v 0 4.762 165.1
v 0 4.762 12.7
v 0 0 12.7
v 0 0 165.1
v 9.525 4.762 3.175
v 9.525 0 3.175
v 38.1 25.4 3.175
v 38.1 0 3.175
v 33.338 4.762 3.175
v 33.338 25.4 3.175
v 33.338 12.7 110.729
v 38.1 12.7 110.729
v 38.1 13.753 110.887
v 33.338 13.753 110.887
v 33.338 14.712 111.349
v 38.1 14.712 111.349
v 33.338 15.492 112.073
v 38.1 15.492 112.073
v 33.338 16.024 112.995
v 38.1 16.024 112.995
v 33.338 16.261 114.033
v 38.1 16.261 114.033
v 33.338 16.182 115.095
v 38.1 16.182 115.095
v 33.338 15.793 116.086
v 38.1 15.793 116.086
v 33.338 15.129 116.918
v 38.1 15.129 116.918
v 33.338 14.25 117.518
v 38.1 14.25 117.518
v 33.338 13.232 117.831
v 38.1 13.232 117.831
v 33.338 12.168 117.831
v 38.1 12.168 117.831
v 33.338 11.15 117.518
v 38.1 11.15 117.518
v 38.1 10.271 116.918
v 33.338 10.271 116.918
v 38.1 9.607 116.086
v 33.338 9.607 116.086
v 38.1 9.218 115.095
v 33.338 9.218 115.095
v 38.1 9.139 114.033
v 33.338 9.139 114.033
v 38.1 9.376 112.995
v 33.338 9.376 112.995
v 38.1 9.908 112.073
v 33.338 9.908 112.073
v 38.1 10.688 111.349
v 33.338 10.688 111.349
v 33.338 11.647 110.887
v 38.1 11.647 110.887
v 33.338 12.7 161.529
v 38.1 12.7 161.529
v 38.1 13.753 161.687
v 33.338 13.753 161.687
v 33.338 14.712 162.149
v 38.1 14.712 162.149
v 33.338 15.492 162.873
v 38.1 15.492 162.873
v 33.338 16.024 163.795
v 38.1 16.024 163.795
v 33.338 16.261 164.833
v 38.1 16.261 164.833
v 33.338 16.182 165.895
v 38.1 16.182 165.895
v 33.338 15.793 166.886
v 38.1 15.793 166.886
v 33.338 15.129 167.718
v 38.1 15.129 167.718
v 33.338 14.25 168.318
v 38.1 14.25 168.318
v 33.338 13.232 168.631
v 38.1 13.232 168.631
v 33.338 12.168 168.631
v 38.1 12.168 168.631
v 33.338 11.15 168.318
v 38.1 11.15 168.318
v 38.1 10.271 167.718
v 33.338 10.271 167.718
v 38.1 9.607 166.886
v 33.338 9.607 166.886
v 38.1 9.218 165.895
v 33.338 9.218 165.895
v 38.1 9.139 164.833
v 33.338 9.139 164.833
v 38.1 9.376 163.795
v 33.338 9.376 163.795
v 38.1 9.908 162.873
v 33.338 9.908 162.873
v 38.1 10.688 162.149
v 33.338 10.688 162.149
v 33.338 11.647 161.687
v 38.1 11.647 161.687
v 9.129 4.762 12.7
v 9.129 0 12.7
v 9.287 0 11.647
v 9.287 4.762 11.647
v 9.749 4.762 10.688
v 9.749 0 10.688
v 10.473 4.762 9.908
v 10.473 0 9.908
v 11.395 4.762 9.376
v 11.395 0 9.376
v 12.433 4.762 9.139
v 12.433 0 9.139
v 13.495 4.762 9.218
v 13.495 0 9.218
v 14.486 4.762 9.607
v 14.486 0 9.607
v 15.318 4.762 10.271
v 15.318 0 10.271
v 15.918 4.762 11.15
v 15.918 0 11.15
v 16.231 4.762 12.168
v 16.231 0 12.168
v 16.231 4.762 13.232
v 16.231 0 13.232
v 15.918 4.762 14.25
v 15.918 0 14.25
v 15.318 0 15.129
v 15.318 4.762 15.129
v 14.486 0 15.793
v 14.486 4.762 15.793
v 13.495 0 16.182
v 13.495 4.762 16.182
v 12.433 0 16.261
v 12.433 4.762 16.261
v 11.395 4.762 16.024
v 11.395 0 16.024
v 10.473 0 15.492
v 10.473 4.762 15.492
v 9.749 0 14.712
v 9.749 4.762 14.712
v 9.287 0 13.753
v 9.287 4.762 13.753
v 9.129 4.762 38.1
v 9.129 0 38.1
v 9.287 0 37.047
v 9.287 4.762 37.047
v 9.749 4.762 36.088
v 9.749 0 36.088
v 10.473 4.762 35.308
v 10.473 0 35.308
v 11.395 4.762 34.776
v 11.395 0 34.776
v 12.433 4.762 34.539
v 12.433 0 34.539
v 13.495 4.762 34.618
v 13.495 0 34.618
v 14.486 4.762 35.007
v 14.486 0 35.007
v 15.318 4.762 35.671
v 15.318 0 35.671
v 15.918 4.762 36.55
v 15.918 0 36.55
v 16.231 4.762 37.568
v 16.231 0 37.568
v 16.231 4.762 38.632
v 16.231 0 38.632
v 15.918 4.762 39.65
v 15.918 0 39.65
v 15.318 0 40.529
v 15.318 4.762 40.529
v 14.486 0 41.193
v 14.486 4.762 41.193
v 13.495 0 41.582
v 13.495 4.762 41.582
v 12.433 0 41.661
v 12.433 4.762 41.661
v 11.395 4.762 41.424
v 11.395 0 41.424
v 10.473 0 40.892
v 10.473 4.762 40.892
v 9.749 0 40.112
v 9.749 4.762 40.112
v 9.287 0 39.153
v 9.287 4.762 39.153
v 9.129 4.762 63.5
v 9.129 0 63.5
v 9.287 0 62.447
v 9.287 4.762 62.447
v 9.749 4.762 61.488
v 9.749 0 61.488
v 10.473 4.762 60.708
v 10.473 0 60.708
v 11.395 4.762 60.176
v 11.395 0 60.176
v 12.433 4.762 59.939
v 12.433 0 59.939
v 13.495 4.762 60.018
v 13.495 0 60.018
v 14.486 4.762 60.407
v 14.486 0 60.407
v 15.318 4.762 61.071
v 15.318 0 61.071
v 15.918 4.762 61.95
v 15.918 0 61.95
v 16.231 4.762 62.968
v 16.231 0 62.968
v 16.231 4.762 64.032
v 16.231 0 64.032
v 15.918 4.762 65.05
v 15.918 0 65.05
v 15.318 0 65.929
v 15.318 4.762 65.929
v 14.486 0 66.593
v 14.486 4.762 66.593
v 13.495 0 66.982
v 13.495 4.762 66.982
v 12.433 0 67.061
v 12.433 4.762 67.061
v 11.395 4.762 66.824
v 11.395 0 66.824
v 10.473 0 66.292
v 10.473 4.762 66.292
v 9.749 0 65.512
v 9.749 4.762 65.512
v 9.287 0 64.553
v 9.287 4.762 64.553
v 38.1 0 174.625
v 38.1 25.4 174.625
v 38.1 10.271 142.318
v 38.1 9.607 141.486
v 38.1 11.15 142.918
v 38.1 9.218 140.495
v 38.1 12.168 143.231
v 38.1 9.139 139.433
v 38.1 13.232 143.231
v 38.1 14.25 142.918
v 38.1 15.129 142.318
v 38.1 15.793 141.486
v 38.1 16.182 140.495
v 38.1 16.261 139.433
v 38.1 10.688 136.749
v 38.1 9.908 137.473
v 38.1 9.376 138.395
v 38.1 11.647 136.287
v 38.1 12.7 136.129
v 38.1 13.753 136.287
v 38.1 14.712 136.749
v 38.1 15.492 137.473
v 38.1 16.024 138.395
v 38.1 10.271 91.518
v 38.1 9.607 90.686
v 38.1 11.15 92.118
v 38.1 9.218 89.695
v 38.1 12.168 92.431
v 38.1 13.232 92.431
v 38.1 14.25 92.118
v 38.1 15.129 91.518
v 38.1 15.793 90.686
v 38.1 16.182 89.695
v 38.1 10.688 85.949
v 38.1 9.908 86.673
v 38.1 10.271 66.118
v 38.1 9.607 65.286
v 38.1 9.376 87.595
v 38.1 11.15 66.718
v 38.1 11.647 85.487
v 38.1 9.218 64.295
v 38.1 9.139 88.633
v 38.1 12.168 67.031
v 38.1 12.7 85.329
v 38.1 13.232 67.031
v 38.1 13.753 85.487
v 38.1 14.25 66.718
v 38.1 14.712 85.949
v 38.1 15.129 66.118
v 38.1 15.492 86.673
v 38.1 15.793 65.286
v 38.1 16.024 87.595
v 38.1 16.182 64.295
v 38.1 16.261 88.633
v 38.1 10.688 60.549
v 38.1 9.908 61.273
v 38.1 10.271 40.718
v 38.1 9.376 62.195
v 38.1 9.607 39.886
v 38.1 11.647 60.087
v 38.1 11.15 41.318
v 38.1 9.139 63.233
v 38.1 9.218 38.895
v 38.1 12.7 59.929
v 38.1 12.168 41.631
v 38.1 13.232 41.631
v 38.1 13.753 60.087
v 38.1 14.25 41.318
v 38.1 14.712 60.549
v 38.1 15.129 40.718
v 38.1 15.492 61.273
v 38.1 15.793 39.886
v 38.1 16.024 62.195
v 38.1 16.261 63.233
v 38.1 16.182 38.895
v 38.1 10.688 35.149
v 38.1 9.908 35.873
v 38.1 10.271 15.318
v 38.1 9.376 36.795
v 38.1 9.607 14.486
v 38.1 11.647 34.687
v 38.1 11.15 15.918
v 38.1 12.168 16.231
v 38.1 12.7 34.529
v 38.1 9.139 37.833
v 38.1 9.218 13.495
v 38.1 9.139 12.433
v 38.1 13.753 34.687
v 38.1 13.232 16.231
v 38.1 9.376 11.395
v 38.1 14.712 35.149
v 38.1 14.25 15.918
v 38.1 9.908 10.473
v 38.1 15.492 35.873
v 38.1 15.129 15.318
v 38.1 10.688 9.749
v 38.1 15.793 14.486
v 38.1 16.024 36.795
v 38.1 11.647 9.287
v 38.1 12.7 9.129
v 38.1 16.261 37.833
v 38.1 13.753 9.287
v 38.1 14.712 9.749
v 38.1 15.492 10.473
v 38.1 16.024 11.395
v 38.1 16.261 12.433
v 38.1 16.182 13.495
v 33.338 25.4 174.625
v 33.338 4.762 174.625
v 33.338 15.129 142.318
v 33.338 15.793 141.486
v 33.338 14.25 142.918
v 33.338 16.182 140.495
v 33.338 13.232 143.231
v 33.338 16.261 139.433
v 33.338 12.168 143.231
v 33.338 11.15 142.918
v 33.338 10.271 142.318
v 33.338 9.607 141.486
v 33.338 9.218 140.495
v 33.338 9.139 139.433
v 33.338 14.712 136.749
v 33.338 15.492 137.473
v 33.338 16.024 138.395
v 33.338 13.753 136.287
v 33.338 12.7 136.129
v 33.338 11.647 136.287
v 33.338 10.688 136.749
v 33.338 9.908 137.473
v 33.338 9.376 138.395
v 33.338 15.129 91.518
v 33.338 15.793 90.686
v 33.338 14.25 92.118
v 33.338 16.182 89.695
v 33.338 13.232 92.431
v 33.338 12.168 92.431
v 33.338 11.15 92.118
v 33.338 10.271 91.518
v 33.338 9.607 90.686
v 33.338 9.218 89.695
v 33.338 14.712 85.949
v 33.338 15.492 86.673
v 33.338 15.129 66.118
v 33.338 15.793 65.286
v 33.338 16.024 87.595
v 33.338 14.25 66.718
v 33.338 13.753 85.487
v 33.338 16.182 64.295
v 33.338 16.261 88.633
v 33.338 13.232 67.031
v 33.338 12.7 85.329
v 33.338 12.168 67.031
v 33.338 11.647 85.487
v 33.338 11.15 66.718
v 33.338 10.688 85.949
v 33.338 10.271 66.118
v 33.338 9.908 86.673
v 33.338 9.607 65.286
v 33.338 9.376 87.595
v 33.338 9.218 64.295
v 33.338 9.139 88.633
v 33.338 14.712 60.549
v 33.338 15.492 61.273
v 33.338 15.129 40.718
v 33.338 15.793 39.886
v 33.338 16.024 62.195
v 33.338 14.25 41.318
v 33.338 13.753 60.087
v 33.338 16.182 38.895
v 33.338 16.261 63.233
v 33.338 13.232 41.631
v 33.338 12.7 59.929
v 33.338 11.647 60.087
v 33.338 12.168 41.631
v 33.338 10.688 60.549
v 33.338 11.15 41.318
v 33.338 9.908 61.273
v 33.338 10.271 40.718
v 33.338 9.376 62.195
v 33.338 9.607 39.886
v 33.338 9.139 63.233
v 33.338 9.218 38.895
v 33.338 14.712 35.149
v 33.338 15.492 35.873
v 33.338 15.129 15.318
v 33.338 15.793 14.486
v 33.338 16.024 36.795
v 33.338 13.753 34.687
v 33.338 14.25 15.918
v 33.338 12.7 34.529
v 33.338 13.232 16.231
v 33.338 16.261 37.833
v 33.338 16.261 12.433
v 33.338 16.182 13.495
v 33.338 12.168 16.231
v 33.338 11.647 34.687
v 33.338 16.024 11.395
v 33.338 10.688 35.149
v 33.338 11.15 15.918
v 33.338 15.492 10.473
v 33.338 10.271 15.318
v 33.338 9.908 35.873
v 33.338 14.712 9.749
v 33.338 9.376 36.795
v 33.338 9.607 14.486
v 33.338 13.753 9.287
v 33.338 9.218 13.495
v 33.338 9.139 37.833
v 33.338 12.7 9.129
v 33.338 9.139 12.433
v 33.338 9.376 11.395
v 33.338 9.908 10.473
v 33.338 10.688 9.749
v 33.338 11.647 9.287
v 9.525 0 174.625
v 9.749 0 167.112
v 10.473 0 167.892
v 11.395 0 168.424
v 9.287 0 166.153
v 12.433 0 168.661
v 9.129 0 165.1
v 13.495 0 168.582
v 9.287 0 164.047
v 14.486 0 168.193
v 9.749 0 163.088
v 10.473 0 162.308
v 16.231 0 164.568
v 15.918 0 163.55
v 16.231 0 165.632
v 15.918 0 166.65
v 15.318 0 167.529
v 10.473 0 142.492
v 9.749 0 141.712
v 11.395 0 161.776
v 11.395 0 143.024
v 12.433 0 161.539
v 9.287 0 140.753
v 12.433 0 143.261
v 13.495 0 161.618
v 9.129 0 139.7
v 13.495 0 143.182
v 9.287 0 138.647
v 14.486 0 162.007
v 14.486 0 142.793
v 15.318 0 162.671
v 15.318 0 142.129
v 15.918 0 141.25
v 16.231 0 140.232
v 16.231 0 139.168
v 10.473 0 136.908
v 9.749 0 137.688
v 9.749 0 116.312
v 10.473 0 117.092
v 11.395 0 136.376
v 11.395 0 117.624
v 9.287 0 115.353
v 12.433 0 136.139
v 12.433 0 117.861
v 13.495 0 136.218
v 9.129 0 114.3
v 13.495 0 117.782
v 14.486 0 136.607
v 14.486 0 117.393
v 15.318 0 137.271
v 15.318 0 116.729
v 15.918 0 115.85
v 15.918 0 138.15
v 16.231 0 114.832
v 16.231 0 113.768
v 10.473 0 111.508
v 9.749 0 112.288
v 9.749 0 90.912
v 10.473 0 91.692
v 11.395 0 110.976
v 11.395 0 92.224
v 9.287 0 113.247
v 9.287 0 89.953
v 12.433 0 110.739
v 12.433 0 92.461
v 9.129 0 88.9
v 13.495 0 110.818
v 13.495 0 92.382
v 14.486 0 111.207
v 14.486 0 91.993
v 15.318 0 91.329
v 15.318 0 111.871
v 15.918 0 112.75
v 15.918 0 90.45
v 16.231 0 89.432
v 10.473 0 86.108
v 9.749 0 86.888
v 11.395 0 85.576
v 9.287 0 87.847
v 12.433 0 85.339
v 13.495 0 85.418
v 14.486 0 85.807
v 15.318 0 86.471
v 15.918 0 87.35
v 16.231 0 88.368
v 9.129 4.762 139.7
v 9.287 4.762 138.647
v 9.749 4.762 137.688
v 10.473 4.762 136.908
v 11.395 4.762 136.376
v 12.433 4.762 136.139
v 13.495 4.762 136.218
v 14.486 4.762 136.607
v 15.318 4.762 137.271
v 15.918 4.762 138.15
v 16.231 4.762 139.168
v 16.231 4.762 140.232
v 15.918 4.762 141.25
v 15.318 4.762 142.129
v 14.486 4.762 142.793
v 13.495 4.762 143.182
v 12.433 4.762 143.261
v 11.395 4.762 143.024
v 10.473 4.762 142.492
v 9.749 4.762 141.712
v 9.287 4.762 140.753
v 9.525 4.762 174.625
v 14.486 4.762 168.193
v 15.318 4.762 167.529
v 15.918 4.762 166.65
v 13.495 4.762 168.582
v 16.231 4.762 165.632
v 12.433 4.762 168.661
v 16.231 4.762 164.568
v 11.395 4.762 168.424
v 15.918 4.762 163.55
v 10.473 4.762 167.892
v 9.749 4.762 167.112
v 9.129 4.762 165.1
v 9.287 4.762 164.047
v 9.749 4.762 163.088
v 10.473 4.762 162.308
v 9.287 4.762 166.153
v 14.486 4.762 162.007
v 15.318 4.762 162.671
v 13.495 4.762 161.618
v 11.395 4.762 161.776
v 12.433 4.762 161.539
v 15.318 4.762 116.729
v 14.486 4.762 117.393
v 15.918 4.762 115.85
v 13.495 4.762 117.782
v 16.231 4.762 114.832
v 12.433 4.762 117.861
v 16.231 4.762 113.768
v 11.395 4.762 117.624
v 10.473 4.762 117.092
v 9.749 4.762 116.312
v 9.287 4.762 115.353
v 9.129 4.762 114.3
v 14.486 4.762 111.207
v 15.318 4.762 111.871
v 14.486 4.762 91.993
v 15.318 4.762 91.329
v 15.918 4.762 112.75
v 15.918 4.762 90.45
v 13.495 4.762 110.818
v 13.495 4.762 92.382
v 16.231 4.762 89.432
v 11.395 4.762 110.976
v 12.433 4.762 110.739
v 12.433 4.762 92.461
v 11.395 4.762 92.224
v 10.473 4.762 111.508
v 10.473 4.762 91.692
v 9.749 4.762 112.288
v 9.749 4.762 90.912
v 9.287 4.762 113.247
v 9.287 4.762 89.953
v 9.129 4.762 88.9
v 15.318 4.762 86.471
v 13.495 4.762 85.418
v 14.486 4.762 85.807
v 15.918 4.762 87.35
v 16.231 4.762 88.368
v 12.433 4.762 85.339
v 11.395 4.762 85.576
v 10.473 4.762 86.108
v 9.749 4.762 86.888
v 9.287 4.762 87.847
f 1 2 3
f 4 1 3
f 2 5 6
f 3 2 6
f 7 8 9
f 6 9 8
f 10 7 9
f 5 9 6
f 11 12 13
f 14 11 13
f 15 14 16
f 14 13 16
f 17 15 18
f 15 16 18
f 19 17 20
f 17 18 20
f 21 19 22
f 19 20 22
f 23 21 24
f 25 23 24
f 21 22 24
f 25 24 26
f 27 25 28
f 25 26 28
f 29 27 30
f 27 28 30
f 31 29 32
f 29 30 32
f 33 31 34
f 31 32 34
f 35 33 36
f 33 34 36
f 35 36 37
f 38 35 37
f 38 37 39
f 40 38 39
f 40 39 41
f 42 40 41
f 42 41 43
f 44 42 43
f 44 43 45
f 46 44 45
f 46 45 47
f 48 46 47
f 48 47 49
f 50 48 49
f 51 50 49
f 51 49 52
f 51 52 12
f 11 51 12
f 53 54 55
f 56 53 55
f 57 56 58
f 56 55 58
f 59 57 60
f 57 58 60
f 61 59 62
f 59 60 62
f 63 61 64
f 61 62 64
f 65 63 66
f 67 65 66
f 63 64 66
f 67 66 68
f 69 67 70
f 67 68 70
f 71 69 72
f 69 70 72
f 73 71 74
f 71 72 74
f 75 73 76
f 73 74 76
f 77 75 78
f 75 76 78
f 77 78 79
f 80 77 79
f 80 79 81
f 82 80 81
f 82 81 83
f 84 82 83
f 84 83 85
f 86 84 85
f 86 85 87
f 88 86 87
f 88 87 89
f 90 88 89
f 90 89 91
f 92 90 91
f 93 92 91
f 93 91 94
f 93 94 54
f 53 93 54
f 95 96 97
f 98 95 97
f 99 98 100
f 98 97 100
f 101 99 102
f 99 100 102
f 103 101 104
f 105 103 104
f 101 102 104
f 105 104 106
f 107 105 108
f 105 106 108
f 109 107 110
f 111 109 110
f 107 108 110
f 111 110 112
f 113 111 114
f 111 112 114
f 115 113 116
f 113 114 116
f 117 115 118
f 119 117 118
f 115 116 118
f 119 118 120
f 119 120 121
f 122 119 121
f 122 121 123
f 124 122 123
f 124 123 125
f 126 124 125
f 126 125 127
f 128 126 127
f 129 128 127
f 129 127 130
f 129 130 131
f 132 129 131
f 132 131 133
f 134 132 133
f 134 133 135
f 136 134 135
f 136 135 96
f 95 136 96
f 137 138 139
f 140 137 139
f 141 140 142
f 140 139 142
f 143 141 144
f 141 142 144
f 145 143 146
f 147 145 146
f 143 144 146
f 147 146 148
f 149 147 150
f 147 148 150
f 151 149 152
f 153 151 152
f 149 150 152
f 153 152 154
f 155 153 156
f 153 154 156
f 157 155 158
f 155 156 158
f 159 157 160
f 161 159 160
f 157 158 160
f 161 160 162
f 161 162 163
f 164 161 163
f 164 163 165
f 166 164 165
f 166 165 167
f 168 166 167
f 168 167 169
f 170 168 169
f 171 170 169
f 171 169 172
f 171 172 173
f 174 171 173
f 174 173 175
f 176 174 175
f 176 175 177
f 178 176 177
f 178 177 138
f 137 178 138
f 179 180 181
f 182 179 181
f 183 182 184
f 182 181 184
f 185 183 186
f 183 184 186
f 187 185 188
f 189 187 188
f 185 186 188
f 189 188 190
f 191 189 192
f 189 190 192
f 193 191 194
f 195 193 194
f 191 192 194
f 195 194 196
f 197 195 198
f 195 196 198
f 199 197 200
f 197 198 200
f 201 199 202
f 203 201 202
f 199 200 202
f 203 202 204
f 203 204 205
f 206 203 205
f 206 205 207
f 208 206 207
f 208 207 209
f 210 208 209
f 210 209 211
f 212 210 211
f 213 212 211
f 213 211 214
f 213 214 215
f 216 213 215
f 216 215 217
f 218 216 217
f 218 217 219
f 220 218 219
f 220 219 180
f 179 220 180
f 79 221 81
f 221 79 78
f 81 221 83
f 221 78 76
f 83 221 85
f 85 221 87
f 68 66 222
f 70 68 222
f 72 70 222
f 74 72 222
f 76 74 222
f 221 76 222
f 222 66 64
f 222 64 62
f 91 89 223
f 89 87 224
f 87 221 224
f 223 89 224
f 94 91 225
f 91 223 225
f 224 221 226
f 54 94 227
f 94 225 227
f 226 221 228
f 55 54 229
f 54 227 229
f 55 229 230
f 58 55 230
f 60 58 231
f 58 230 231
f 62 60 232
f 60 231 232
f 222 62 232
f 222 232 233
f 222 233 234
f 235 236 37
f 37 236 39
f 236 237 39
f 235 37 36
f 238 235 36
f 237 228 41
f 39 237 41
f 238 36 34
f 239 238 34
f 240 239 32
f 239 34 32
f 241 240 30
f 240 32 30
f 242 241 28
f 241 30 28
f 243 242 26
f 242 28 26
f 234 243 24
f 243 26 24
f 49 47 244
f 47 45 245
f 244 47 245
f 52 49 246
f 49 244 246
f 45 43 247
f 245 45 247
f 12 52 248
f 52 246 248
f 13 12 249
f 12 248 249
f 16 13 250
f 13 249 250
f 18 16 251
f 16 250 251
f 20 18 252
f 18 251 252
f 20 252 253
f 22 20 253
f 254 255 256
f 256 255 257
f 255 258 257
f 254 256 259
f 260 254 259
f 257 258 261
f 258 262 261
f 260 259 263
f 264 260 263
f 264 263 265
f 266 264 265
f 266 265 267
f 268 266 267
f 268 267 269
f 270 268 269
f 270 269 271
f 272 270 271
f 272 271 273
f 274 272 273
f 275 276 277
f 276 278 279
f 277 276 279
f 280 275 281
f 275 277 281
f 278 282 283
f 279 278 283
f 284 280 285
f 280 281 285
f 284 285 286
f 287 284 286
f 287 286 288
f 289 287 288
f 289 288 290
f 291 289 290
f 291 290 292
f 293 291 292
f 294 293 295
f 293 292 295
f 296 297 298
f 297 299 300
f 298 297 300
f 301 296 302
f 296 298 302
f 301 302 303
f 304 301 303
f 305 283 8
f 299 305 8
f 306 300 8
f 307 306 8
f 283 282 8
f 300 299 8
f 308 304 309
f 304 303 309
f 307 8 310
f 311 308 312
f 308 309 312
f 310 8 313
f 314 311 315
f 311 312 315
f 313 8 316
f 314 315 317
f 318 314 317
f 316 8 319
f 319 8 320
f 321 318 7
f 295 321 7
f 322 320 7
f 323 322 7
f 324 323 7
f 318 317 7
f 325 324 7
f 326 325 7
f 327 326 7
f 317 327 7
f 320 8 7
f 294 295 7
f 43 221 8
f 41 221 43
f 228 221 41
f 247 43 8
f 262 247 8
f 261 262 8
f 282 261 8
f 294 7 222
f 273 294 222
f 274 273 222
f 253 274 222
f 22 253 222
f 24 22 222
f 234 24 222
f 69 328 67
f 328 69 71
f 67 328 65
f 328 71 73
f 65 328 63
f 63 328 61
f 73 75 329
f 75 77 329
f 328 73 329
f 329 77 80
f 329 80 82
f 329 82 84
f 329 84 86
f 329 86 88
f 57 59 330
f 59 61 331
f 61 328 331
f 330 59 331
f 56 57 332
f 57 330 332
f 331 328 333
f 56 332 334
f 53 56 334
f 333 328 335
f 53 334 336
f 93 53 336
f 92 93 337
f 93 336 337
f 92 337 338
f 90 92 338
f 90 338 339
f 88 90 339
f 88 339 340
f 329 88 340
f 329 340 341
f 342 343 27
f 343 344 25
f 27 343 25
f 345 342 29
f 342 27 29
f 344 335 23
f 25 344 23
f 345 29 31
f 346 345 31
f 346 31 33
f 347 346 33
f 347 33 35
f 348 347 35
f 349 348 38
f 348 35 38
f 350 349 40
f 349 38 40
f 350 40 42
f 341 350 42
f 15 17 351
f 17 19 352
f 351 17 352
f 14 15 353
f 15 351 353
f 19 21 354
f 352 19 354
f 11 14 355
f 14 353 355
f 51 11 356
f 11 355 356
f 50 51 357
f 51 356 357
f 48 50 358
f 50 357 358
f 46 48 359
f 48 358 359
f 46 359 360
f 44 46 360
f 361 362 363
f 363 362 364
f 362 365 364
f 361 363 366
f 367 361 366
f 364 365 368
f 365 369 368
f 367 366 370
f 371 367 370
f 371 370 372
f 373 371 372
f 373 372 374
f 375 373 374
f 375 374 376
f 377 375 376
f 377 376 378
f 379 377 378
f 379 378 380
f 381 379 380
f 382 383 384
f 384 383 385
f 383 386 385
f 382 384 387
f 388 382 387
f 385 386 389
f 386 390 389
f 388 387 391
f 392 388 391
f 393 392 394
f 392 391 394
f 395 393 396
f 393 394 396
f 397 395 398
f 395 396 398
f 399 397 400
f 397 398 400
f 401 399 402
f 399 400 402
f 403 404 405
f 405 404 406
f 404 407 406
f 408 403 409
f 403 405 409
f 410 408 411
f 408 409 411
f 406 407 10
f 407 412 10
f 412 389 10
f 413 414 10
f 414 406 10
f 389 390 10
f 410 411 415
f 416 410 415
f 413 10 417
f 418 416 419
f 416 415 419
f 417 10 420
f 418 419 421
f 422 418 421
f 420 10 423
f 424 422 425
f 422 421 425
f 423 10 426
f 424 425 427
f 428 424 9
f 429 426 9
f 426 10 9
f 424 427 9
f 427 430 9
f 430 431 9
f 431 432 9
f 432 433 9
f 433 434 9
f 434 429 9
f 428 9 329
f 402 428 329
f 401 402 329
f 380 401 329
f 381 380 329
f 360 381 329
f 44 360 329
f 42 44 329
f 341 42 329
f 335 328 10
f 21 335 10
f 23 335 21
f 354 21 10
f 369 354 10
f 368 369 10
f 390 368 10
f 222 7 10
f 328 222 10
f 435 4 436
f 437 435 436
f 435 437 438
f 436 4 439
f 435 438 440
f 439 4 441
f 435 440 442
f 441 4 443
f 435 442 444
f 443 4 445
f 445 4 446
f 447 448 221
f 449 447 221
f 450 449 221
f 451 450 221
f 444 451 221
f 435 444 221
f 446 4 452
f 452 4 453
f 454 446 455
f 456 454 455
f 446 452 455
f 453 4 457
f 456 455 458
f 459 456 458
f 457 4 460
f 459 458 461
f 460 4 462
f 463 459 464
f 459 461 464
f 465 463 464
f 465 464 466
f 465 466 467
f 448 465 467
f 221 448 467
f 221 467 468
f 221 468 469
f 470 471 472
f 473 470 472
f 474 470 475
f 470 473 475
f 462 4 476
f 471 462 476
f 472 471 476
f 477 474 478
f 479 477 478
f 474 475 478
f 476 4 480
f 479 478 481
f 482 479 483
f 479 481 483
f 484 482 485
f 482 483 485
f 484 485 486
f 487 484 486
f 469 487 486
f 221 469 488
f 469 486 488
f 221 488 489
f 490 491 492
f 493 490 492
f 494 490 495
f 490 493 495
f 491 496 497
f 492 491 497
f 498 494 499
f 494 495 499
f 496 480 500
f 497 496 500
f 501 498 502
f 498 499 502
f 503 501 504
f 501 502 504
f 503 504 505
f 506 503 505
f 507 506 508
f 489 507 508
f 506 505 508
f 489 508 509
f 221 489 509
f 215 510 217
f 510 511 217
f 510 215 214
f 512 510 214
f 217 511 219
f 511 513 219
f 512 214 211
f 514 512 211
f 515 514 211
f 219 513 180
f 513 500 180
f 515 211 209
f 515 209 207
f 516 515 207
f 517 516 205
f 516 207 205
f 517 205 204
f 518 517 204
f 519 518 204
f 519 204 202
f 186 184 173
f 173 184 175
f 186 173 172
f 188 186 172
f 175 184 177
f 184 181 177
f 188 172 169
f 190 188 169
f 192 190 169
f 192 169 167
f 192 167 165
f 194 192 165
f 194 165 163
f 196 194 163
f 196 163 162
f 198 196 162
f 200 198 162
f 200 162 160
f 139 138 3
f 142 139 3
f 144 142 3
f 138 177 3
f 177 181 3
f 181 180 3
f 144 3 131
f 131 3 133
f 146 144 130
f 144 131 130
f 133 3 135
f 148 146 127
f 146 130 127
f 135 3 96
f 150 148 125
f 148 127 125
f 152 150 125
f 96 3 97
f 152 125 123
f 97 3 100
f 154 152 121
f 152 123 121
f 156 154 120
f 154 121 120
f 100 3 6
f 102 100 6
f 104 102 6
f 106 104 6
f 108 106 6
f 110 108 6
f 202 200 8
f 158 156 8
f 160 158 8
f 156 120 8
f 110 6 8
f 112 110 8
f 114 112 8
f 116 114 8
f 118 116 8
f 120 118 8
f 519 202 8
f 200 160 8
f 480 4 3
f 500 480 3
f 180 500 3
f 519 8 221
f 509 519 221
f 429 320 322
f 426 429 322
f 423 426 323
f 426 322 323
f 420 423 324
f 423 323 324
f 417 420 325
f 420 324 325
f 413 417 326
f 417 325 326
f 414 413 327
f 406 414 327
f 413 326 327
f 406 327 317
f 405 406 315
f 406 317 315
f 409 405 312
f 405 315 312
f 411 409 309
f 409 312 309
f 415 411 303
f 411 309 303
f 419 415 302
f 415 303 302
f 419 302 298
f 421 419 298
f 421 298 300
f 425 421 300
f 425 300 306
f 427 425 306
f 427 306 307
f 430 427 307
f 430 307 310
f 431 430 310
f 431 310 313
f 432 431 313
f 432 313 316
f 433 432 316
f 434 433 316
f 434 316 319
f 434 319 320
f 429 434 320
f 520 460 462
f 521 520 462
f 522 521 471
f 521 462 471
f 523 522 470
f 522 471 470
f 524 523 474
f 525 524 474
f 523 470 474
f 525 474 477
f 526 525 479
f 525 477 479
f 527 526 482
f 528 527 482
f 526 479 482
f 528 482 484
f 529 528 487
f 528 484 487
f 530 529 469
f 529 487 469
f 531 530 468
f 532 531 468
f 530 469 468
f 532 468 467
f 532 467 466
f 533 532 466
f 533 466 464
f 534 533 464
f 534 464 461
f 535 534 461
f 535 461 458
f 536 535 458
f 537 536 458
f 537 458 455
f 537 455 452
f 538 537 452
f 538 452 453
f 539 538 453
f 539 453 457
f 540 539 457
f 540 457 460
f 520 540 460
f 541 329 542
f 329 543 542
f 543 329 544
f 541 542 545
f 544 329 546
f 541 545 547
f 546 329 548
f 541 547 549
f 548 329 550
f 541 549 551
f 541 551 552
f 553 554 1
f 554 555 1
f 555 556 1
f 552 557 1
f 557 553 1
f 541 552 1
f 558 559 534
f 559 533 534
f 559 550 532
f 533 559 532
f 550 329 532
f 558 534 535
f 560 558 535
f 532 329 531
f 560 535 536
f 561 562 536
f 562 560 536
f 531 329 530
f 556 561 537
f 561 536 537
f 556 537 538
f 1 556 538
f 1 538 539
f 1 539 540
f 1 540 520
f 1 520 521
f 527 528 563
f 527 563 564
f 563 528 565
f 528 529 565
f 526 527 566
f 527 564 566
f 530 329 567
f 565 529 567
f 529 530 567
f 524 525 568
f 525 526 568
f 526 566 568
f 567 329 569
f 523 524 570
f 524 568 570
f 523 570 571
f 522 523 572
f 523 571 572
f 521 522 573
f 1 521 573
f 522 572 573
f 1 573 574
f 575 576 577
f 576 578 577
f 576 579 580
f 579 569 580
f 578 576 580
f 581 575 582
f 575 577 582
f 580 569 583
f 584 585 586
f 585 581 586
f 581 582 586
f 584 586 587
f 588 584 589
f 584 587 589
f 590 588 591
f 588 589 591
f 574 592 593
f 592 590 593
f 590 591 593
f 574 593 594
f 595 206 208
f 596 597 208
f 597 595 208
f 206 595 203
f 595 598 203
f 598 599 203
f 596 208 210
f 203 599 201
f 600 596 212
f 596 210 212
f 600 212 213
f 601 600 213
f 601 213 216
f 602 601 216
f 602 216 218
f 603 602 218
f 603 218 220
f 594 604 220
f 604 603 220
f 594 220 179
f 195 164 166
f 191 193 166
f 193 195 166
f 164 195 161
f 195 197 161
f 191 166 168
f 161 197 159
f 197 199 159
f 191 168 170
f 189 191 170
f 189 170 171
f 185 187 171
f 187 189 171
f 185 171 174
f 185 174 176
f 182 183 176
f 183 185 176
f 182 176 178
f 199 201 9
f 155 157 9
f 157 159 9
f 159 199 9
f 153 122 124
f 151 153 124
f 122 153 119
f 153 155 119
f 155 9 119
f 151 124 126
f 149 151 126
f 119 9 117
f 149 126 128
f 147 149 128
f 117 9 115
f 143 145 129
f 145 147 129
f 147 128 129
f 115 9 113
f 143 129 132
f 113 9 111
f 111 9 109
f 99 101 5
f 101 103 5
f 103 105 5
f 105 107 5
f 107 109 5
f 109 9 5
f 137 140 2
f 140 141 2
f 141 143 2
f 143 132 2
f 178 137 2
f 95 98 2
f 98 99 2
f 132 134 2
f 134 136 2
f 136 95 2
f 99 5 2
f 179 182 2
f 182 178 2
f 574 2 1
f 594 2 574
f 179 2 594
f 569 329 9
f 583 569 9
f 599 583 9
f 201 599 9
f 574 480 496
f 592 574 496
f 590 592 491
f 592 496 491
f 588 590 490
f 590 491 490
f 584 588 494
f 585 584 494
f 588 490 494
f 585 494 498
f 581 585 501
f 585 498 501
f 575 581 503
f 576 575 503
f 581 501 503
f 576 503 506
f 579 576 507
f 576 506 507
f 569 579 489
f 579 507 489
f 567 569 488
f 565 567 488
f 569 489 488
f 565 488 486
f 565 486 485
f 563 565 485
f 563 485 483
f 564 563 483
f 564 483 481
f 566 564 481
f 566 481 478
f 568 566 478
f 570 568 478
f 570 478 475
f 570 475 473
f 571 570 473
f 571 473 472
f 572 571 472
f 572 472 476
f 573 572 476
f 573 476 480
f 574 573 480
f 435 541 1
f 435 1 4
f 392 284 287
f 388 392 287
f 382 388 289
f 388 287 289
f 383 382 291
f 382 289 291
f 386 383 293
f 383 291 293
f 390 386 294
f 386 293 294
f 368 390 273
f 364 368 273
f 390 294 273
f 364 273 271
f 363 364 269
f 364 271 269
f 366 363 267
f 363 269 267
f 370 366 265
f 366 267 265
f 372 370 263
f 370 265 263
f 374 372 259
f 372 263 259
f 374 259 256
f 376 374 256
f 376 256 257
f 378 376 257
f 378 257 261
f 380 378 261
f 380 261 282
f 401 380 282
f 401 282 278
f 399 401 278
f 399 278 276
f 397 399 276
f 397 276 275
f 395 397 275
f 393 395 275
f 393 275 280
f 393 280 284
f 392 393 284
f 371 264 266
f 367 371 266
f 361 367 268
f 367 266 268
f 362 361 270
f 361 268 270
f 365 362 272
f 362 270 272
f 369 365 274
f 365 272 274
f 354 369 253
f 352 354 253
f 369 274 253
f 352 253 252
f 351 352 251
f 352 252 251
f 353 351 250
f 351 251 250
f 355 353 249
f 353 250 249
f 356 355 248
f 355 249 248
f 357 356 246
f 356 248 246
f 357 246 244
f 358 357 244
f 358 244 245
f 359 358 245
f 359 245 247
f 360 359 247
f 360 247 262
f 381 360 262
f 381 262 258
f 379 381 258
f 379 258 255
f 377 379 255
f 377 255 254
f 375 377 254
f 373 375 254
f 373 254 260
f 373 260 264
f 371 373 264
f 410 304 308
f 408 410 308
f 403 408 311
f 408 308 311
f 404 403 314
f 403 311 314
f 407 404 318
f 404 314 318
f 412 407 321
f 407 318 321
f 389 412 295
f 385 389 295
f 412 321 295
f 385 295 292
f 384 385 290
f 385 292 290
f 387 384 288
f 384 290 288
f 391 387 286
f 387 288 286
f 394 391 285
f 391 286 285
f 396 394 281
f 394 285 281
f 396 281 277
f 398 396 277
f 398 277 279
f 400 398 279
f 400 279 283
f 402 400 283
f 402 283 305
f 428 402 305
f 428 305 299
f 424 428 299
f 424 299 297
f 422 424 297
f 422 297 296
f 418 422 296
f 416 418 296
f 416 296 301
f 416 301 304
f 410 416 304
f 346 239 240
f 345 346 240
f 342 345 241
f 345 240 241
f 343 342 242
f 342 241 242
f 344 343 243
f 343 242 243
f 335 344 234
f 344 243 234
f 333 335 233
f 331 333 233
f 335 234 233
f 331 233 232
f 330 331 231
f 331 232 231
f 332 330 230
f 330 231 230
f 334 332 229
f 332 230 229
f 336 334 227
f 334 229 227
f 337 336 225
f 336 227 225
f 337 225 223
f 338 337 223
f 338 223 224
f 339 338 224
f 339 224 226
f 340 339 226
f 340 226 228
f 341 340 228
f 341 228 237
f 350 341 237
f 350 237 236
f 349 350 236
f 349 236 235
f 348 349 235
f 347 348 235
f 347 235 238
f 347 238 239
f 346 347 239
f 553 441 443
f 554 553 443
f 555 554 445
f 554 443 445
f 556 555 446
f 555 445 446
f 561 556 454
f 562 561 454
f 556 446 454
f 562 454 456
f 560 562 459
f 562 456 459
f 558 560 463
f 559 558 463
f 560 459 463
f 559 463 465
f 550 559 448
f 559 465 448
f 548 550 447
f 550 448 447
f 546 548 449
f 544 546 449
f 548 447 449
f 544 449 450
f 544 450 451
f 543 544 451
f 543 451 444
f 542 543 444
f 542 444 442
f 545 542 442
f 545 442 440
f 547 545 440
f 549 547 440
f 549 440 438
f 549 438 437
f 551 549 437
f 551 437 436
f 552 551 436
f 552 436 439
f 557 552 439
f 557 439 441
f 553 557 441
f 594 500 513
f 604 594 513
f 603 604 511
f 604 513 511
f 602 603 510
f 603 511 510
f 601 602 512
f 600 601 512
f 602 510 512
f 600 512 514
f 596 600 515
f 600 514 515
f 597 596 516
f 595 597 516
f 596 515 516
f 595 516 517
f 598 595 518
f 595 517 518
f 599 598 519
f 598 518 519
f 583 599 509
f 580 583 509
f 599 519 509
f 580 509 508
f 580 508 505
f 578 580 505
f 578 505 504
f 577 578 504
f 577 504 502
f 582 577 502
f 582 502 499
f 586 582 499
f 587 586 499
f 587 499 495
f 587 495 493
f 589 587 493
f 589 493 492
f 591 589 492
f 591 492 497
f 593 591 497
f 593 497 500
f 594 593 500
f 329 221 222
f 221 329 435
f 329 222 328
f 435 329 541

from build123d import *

# Parameters (mm, degrees)
BOSS_EXTRUDE1_DEPTH         = 177.8
F_1_4_CLEARANCE_HOLE1_D     = 7.14248
F_1_4_CLEARANCE_HOLE2_D     = 7.14248
F_1_4_CLEARANCE_HOLE2_DEPTH = 4.7625
CHAMFER1_SIZE               = 12.7
SKETCH10_W                  = 38.1
SKETCH10_H                  = 25.4
CUT_EXTRUDE1_DEPTH          = 3.175


with BuildPart() as part:
    # Sketch1 → Boss-Extrude1 (new body)
    with BuildSketch(Plane.XY):
        Polygon((0, 0), (38.1, 0), (38.1, 25.4), (33.3375, 25.4), (33.3375, 4.7625), (0, 4.7625), align=None)
    extrude(amount=BOSS_EXTRUDE1_DEPTH)

    # 1/4 Clearance Hole1 (through all)
    with Locations(Plane(origin=(0, 4.7625, 0), x_dir=(1, 0, 0), z_dir=(0, 1, 0))):
        with Locations((12.7, -12.7), (12.7, -165.1), (12.7, -139.7), (12.7, -114.3), (12.7, -88.9), (12.7, -63.5), (12.7, -38.1)):
            Hole(F_1_4_CLEARANCE_HOLE1_D / 2)

    # 1/4 Clearance Hole2
    with Locations(Plane.ZY.offset(-33.3375)):
        with Locations((190.5, 12.7), (12.7, 12.7), (38.1, 12.7), (63.5, 12.7), (88.9, 12.7), (114.3, 12.7), (139.7, 12.7), (165.1, 12.7)):
            Hole(F_1_4_CLEARANCE_HOLE2_D / 2, depth=F_1_4_CLEARANCE_HOLE2_DEPTH)

    # Chamfer1
    chamfer1_edges = [part.edges().sort_by_distance(p)[0] for p in [
        (0, 2.38125, 177.8),
        (0, 2.38125, 0),
    ]]
    chamfer(chamfer1_edges, length=CHAMFER1_SIZE)

    # Sketch10 → Cut-Extrude1 (cut)
    with BuildSketch(Plane(origin=(0, 0, 0), x_dir=(-1, 0, 0), z_dir=(0, 0, -1))):
        with Locations((-19.05, 12.7)):
            Rectangle(SKETCH10_W, SKETCH10_H)
    cut_extrude1 = extrude(amount=-CUT_EXTRUDE1_DEPTH, mode=Mode.SUBTRACT)

    # Mirror1: Cut-Extrude1 across plane
    add(cut_extrude1.mirror(Plane(origin=(0, 0, 88.9), x_dir=(1, 0, 0), z_dir=(0, 0, -1))), mode=Mode.SUBTRACT)


solid = part.part
